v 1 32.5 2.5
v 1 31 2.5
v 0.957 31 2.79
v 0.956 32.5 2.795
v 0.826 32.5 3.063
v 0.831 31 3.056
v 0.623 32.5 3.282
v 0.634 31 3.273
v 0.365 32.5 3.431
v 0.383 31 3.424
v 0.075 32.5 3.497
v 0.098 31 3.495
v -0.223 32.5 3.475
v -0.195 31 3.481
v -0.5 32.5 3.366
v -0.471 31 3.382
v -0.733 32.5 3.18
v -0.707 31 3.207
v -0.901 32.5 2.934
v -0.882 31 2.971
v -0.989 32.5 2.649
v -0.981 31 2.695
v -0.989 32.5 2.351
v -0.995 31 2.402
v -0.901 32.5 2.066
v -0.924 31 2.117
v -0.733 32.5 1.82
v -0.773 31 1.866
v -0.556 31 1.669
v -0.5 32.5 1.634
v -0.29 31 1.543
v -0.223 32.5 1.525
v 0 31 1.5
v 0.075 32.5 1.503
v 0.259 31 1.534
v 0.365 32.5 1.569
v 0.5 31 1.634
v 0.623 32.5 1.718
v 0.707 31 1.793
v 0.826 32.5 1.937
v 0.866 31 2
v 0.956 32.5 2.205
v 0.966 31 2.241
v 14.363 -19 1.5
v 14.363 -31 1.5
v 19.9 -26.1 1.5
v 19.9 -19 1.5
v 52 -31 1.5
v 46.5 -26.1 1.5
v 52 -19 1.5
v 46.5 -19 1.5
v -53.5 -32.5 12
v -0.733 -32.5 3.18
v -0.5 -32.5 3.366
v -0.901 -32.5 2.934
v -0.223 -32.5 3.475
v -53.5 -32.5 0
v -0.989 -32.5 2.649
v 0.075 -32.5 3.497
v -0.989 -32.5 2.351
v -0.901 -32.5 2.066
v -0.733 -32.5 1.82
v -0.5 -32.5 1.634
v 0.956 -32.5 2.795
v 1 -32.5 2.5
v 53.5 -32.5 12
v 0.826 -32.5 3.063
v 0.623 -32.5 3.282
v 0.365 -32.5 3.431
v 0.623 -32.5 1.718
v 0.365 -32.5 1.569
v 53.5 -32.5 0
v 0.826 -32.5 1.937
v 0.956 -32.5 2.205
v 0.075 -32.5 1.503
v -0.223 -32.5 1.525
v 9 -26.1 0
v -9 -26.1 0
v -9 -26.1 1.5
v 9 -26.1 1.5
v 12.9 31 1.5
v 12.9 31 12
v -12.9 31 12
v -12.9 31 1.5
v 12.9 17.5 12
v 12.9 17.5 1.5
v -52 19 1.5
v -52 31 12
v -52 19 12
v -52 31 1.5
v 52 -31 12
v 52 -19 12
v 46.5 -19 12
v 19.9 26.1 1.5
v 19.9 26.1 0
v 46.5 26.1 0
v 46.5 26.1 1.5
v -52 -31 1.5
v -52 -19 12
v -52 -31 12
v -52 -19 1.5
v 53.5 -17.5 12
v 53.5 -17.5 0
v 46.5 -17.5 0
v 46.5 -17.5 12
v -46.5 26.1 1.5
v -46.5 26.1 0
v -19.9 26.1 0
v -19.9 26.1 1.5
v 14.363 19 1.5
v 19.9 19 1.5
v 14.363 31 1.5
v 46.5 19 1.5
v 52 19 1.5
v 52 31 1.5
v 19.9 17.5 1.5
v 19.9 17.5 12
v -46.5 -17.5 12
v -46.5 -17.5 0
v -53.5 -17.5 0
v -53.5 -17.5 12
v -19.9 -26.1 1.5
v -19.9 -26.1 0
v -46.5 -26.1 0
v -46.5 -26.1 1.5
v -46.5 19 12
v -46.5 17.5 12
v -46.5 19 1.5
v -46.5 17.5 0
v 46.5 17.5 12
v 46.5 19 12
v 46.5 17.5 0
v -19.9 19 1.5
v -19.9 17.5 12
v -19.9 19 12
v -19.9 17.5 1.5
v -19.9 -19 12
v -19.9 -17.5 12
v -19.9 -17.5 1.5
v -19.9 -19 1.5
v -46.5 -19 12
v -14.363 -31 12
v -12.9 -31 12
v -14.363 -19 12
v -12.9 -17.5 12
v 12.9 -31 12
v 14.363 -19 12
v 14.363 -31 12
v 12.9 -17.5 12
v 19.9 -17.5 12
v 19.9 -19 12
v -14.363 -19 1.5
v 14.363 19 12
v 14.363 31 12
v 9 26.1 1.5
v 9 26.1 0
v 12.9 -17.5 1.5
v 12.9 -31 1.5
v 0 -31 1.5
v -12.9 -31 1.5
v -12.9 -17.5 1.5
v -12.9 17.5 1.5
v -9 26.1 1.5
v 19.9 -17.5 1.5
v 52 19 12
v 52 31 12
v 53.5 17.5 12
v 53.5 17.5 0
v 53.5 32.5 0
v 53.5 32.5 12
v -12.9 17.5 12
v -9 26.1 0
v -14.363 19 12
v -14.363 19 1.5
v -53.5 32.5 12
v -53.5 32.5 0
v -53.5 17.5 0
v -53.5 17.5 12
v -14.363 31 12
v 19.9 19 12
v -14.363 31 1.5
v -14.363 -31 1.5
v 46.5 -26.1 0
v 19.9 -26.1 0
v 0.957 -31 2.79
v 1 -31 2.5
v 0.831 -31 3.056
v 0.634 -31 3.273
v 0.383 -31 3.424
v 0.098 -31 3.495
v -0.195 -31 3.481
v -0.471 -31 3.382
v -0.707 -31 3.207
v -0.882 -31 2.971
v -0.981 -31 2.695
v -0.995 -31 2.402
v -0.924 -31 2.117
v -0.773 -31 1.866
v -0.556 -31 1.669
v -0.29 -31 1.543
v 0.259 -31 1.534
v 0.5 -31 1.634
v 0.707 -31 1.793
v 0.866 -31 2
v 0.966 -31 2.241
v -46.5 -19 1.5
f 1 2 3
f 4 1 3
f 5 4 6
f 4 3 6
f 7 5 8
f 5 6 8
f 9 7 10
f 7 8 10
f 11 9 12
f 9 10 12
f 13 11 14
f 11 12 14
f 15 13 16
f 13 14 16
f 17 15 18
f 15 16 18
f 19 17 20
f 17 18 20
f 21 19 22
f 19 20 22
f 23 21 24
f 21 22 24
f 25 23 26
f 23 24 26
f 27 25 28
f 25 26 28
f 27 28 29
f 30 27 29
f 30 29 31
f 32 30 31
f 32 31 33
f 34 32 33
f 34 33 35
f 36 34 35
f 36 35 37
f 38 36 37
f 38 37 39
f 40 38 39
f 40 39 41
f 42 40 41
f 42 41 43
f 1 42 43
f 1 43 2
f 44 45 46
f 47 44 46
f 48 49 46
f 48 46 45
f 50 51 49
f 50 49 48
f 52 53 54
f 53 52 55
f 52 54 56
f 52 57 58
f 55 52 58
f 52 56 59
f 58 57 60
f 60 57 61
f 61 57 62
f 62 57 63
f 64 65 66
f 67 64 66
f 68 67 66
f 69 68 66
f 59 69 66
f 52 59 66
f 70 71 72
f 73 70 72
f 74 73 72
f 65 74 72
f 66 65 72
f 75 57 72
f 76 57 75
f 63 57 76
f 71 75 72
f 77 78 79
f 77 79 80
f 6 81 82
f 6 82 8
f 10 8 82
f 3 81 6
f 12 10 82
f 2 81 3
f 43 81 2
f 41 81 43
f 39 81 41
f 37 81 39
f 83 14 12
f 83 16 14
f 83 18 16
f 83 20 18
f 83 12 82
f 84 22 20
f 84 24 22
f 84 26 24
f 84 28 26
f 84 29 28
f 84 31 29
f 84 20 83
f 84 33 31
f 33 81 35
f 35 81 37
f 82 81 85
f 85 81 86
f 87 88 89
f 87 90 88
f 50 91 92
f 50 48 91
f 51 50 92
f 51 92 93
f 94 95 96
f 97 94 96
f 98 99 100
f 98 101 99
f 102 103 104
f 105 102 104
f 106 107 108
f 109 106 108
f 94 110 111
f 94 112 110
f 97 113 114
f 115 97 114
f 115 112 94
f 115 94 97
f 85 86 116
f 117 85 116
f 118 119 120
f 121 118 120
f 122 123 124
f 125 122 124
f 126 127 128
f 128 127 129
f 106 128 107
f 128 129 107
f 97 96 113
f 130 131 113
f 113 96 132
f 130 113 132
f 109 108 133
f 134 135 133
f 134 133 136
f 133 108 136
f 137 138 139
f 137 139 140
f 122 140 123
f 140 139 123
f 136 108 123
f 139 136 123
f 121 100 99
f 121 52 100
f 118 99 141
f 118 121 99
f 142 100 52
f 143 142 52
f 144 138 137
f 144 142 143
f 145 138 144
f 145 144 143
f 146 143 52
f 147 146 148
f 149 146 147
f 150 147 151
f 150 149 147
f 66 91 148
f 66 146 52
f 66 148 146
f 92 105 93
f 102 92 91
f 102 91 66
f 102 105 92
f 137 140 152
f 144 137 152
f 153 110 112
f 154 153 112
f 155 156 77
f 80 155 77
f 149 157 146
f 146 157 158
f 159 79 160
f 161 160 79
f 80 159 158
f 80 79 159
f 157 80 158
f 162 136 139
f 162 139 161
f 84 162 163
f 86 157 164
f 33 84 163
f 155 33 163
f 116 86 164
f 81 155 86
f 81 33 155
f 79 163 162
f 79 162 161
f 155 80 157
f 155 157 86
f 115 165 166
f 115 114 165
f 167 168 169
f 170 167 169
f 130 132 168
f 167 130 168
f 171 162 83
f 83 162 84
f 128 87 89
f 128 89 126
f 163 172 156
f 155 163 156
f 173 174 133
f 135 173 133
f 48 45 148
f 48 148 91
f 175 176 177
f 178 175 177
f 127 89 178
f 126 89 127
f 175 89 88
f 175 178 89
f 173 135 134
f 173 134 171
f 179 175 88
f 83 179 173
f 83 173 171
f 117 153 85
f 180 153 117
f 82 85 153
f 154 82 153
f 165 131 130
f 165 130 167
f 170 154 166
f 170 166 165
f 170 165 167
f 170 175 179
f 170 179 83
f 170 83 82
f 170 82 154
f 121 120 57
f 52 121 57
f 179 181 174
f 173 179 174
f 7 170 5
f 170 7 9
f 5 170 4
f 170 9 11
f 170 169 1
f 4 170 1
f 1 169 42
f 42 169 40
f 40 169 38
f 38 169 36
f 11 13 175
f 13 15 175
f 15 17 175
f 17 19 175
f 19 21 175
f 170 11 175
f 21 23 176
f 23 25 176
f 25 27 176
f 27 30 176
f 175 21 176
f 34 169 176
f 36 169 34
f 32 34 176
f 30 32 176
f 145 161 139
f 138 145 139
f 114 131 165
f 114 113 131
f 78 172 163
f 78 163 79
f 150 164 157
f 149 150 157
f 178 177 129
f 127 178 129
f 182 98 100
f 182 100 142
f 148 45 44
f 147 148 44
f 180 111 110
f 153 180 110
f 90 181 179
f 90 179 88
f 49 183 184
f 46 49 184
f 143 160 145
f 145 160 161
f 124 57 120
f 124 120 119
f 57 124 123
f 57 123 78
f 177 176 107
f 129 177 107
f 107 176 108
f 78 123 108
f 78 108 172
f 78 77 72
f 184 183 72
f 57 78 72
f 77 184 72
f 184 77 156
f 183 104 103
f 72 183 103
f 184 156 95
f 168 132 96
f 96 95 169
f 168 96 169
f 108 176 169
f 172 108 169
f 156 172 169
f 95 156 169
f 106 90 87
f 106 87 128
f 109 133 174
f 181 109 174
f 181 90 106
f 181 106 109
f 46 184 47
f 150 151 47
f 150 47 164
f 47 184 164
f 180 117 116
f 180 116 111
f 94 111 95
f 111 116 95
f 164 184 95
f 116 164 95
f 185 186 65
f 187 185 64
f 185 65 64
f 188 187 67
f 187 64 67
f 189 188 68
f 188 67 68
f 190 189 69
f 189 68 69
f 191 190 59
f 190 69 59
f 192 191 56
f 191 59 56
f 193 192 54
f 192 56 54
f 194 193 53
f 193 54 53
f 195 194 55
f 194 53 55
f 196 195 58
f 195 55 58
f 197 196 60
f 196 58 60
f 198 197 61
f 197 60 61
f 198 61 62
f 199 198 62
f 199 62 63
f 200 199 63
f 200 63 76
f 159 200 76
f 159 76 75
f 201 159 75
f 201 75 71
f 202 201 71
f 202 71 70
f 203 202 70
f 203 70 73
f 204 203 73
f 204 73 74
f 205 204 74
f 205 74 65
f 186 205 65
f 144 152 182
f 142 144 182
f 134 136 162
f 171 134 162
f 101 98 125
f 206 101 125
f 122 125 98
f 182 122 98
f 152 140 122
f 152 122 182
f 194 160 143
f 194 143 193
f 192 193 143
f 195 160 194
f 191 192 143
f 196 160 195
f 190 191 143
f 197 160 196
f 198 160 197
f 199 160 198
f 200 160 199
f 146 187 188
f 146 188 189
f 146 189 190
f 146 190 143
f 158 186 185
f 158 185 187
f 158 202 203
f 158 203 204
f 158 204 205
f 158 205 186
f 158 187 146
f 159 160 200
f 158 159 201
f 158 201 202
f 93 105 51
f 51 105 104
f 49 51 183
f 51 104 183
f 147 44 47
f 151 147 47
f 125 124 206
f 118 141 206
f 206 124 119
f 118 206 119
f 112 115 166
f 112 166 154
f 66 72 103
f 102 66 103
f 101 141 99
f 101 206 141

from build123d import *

# Parameters (mm, degrees)
F1_DEPTH = 12
F2_T     = -1.5
F3_R     = 1
F4_DEPTH = 70
F5_W     = 18
F5_H     = 52.2
F6_DEPTH = 25
F9_DEPTH = 10.5


with BuildPart() as f1:
    # F0 (on Top) → F1 (new body)
    with BuildSketch(Plane.XY):
        Polygon((53.5, 32.5), (0, 32.5), (-53.5, 32.5), (-53.5, 17.5), (-46.5, 17.5), (-46.5, 0), (-46.5, -17.5), (-53.5, -17.5), (-53.5, -32.5), (0, -32.5), (53.5, -32.5), (53.5, -17.5), (46.5, -17.5), (46.5, 0), (46.5, 17.5), (53.5, 17.5), align=None)
    extrude(amount=F1_DEPTH)

    # F2
    f2_openings = [f1.faces().sort_by_distance(p)[0] for p in [
        (0, 0, 12),
    ]]
    offset(amount=F2_T, openings=f2_openings)

    # F3 (on face) → F4 (cut)
    with BuildSketch(Plane.XZ.offset(32.5)):
        with Locations((0, 2.5)):
            Circle(F3_R)
    extrude(amount=-F4_DEPTH, mode=Mode.SUBTRACT)

    # F5 (on face) → F6 (cut)
    with BuildSketch(Plane(origin=(0, 0, 0), x_dir=(1, 0, 0), z_dir=(0, 0, -1))):
        Polygon((-19.9, 26.1), (-46.5, 26.1), (-46.5, 17.5), (-46.5, -17.5), (-46.5, -26.1), (-19.9, -26.1), align=None)
        Rectangle(F5_W, F5_H)
        Polygon((46.5, -17.5), (46.5, 17.5), (46.5, 26.1), (19.9, 26.1), (19.9, -26.1), (46.5, -26.1), align=None)
    extrude(amount=-F6_DEPTH, mode=Mode.SUBTRACT)

    # F8 (on face) → F9 (join)
    with BuildSketch(Plane.XY.offset(1.5)):
        Polygon((-19.9, 17.5), (-12.9, 17.5), (-12.9, 31), (-14.362971, 31), (-14.362971, 19), (-19.9, 19), align=None)
        Polygon((12.9, 31), (12.9, 17.5), (19.9, 17.5), (19.9, 19), (14.362971, 19), (14.362971, 31), align=None)
        Polygon((19.9, -17.5), (12.9, -17.5), (12.9, -31), (14.362971, -31), (14.362971, -19), (19.9, -19), align=None)
        Polygon((-19.9, -17.5), (-19.9, -19), (-14.362971, -19), (-14.362971, -31), (-12.9, -31), (-12.9, -17.5), align=None)
    extrude(amount=F9_DEPTH)


solid = f1.part
